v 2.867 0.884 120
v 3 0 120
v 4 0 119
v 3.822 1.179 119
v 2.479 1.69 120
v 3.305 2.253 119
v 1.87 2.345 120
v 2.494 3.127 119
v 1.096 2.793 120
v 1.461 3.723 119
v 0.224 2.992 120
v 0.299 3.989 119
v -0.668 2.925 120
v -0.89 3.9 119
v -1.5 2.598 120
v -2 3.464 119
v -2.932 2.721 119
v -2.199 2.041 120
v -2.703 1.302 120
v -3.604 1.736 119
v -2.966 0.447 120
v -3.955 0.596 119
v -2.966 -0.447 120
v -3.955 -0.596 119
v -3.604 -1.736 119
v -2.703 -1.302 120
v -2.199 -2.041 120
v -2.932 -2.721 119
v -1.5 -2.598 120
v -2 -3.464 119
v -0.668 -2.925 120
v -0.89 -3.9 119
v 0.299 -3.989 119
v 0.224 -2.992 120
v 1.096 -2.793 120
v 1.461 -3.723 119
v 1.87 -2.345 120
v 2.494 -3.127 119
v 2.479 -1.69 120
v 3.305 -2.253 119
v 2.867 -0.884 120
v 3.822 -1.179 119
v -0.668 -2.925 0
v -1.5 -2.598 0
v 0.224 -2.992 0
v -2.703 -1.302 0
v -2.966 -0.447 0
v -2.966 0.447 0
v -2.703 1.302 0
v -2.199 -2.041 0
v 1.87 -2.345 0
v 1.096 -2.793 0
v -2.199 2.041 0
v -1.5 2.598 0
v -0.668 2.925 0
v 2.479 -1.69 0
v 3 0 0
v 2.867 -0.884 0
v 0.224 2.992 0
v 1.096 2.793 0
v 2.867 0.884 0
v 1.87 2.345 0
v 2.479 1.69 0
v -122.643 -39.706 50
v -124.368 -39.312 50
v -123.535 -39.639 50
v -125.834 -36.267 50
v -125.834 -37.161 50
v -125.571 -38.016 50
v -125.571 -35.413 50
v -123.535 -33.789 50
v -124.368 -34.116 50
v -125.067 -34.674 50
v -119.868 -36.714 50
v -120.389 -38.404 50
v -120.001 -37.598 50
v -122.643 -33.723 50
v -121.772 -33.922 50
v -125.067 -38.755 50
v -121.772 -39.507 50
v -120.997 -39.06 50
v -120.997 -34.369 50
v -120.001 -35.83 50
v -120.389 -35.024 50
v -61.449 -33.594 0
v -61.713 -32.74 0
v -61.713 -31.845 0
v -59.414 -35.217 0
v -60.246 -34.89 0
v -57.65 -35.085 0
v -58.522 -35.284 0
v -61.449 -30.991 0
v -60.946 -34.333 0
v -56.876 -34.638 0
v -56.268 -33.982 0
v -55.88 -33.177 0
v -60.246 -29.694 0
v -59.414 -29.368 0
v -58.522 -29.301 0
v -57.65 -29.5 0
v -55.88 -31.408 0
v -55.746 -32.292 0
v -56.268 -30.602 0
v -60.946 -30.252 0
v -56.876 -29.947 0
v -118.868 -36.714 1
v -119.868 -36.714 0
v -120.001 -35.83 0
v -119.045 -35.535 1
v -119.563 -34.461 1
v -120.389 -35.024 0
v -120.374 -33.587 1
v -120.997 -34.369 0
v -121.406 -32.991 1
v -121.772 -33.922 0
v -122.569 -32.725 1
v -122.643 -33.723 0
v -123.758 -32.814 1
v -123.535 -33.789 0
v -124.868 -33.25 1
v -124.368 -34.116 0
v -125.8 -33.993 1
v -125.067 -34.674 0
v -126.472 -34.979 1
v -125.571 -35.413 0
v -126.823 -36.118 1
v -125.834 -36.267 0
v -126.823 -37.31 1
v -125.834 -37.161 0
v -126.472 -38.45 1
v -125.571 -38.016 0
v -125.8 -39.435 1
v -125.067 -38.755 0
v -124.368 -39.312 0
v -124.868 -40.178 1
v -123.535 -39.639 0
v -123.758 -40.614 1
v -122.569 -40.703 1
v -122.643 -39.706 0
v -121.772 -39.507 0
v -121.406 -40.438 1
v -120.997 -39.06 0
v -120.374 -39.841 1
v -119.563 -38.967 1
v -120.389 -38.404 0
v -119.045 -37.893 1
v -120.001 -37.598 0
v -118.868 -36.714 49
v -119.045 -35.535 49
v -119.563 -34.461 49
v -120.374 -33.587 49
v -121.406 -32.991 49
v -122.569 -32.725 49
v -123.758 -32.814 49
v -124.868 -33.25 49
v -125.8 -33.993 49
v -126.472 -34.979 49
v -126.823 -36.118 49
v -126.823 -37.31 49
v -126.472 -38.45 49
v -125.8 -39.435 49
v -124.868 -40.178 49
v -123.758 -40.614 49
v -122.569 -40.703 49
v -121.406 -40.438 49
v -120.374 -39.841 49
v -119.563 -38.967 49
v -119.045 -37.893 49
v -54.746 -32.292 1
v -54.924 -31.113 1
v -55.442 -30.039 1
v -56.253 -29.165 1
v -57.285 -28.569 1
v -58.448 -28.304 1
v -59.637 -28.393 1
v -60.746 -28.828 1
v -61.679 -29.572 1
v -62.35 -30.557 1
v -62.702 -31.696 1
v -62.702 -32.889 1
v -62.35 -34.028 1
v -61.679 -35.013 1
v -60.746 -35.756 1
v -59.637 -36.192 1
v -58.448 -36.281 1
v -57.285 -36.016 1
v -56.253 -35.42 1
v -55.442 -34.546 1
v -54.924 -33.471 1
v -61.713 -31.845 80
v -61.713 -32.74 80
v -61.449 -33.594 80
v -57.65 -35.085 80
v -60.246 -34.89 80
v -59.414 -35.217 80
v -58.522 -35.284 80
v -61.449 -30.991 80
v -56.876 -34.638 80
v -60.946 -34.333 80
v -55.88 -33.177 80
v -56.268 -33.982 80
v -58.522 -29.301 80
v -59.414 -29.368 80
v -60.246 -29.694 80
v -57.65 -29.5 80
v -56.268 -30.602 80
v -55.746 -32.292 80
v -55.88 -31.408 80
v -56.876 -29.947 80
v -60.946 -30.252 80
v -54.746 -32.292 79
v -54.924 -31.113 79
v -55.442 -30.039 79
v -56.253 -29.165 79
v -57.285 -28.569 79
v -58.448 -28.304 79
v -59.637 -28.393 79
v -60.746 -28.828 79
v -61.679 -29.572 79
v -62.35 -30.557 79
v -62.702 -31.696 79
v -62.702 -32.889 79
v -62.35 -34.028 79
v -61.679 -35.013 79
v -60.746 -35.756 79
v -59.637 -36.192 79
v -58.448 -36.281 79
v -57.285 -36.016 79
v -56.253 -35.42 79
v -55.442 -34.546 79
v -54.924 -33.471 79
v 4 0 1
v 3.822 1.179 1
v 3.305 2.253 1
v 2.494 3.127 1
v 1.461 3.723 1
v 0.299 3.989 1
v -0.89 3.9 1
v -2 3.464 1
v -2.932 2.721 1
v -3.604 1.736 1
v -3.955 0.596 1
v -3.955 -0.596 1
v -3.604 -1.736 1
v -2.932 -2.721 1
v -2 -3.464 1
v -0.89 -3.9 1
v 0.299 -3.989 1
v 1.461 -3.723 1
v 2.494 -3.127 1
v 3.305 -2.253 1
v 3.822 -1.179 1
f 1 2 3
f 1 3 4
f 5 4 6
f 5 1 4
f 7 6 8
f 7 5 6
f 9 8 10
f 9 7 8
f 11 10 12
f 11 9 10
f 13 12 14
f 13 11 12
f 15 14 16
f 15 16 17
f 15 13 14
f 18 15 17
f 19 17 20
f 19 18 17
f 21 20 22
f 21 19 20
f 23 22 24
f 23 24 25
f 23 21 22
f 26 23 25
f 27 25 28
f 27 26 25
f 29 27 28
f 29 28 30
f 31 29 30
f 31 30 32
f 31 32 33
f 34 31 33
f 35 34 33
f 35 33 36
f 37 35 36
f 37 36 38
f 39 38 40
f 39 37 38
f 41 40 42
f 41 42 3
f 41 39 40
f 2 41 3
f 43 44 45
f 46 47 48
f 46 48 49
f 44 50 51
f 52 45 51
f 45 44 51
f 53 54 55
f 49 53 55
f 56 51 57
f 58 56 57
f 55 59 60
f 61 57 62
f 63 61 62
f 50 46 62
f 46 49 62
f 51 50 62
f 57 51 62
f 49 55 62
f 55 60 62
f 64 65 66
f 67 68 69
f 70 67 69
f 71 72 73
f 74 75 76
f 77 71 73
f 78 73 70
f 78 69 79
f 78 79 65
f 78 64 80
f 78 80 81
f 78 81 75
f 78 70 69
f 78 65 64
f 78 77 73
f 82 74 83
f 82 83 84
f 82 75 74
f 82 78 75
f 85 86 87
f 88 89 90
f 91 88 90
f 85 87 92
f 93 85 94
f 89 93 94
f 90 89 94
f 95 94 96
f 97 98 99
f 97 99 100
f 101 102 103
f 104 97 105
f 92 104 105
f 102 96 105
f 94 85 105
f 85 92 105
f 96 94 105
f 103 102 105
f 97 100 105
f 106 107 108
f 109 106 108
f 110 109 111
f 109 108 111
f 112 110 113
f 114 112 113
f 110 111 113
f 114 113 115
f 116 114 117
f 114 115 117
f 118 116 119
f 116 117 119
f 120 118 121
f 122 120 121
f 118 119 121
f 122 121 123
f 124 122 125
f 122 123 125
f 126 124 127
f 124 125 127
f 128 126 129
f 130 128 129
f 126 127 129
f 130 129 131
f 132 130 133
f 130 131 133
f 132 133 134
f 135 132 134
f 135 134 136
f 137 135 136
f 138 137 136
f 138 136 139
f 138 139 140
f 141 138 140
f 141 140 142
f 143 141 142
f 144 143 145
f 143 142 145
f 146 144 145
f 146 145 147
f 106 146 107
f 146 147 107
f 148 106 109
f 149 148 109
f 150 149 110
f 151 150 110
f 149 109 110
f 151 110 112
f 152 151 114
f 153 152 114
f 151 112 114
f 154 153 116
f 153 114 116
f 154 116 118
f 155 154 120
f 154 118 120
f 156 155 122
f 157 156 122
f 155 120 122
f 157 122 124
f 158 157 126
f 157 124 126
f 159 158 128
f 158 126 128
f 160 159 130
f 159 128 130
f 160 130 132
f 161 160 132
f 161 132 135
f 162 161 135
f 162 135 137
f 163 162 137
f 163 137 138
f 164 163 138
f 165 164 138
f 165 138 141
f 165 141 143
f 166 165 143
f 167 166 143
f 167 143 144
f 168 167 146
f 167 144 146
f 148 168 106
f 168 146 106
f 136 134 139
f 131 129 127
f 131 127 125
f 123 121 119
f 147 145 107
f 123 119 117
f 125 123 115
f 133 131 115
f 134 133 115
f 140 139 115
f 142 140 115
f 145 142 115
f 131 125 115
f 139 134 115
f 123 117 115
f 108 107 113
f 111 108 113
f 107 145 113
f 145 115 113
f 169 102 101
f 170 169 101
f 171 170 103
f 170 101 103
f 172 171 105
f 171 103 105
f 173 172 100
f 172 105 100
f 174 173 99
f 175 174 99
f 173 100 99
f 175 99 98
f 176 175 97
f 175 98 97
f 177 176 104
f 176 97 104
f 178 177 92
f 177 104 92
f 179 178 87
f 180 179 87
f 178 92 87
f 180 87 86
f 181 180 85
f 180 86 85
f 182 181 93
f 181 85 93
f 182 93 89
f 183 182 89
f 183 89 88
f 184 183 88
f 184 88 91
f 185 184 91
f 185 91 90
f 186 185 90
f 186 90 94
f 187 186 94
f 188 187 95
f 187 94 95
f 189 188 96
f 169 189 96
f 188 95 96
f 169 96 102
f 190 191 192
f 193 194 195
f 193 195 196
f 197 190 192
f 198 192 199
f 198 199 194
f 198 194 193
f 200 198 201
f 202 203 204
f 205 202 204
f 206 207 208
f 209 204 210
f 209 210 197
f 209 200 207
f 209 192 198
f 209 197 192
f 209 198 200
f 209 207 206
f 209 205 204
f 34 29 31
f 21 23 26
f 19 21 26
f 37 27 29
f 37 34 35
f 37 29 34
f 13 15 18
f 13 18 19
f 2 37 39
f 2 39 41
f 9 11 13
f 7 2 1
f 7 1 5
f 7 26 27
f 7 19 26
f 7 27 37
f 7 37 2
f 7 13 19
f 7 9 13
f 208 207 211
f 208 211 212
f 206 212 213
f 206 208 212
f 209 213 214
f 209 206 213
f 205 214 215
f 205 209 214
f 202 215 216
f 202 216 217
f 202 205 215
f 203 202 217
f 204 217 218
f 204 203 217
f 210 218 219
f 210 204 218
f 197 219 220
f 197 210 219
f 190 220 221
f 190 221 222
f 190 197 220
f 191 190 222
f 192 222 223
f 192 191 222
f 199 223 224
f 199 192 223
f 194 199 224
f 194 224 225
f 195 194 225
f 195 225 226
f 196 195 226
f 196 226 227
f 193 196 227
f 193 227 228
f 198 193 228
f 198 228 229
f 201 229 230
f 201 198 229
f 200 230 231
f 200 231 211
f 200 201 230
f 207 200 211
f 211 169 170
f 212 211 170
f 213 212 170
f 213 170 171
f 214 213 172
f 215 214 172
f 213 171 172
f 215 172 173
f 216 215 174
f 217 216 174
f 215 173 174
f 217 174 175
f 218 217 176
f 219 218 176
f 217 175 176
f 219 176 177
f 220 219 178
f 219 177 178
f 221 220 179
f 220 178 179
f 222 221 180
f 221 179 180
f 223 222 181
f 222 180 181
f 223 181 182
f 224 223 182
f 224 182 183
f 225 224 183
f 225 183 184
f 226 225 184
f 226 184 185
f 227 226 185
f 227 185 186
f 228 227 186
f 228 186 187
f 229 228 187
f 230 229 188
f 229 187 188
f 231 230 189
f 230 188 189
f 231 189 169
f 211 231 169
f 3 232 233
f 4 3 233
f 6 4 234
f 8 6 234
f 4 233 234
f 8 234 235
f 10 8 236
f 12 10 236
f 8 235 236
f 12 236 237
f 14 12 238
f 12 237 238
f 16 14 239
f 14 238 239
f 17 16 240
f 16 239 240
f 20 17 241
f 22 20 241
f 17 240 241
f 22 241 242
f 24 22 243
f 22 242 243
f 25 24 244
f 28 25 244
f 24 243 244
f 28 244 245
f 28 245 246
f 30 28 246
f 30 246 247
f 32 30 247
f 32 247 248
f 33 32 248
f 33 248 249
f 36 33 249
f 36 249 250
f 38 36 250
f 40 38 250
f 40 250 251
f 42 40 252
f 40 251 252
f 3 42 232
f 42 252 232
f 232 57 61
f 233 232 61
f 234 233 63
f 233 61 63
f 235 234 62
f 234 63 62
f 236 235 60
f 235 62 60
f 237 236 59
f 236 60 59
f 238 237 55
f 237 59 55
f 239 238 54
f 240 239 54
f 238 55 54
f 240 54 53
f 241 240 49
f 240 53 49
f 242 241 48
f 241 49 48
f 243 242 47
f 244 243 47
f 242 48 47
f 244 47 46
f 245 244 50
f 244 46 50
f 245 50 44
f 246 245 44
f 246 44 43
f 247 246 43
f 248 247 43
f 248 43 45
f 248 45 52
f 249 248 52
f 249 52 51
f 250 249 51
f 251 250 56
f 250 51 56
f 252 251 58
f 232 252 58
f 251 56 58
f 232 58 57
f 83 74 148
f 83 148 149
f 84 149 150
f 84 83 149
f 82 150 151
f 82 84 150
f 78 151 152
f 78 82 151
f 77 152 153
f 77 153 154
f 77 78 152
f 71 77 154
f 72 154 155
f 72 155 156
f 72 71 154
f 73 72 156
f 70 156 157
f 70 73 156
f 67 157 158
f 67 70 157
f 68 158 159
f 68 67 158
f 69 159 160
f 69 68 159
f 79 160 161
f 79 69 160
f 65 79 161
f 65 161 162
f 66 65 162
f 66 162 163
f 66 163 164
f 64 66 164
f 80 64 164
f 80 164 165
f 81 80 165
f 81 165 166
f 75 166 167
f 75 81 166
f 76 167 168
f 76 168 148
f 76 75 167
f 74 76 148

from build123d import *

# Parameters (mm, degrees)
F0_R     = 4
F1_DEPTH = 120
F2_SIZE  = 1
F3_R     = 4
F4_DEPTH = 50
F5_SIZE  = 1
F6_R     = 4
F7_DEPTH = 80
F8_SIZE  = 1


with BuildPart() as f1:
    # F0 (on Top) → F1 (new body)
    with BuildSketch(Plane.XY):
        Circle(F0_R)
    extrude(amount=F1_DEPTH)

    # F2
    f2_edges = [f1.edges().sort_by_distance(p)[0] for p in [
        (-4, 0, 120),
        (-4, 0, 0),
    ]]
    chamfer(f2_edges, length=F2_SIZE)


with BuildPart() as f4:
    # F3 (on Top) → F4 (new body)
    with BuildSketch(Plane.XY):
        with Locations((-122.867644, -36.714155)):
            Circle(F3_R)
    extrude(amount=F4_DEPTH)

    # F5
    f5_edges = [f4.edges().sort_by_distance(p)[0] for p in [
        (-126.867644, -36.714155, 50),
        (-126.867644, -36.714155, 0),
    ]]
    chamfer(f5_edges, length=F5_SIZE)


with BuildPart() as f7:
    # F6 (on Top) → F7 (new body)
    with BuildSketch(Plane.XY):
        with Locations((-58.746498, -32.292377)):
            Circle(F6_R)
    extrude(amount=F7_DEPTH)

    # F8
    f8_edges = [f7.edges().sort_by_distance(p)[0] for p in [
        (-62.746498, -32.292377, 80),
        (-62.746498, -32.292377, 0),
    ]]
    chamfer(f8_edges, length=F8_SIZE)


solid = Compound([f1.part, f4.part, f7.part])
